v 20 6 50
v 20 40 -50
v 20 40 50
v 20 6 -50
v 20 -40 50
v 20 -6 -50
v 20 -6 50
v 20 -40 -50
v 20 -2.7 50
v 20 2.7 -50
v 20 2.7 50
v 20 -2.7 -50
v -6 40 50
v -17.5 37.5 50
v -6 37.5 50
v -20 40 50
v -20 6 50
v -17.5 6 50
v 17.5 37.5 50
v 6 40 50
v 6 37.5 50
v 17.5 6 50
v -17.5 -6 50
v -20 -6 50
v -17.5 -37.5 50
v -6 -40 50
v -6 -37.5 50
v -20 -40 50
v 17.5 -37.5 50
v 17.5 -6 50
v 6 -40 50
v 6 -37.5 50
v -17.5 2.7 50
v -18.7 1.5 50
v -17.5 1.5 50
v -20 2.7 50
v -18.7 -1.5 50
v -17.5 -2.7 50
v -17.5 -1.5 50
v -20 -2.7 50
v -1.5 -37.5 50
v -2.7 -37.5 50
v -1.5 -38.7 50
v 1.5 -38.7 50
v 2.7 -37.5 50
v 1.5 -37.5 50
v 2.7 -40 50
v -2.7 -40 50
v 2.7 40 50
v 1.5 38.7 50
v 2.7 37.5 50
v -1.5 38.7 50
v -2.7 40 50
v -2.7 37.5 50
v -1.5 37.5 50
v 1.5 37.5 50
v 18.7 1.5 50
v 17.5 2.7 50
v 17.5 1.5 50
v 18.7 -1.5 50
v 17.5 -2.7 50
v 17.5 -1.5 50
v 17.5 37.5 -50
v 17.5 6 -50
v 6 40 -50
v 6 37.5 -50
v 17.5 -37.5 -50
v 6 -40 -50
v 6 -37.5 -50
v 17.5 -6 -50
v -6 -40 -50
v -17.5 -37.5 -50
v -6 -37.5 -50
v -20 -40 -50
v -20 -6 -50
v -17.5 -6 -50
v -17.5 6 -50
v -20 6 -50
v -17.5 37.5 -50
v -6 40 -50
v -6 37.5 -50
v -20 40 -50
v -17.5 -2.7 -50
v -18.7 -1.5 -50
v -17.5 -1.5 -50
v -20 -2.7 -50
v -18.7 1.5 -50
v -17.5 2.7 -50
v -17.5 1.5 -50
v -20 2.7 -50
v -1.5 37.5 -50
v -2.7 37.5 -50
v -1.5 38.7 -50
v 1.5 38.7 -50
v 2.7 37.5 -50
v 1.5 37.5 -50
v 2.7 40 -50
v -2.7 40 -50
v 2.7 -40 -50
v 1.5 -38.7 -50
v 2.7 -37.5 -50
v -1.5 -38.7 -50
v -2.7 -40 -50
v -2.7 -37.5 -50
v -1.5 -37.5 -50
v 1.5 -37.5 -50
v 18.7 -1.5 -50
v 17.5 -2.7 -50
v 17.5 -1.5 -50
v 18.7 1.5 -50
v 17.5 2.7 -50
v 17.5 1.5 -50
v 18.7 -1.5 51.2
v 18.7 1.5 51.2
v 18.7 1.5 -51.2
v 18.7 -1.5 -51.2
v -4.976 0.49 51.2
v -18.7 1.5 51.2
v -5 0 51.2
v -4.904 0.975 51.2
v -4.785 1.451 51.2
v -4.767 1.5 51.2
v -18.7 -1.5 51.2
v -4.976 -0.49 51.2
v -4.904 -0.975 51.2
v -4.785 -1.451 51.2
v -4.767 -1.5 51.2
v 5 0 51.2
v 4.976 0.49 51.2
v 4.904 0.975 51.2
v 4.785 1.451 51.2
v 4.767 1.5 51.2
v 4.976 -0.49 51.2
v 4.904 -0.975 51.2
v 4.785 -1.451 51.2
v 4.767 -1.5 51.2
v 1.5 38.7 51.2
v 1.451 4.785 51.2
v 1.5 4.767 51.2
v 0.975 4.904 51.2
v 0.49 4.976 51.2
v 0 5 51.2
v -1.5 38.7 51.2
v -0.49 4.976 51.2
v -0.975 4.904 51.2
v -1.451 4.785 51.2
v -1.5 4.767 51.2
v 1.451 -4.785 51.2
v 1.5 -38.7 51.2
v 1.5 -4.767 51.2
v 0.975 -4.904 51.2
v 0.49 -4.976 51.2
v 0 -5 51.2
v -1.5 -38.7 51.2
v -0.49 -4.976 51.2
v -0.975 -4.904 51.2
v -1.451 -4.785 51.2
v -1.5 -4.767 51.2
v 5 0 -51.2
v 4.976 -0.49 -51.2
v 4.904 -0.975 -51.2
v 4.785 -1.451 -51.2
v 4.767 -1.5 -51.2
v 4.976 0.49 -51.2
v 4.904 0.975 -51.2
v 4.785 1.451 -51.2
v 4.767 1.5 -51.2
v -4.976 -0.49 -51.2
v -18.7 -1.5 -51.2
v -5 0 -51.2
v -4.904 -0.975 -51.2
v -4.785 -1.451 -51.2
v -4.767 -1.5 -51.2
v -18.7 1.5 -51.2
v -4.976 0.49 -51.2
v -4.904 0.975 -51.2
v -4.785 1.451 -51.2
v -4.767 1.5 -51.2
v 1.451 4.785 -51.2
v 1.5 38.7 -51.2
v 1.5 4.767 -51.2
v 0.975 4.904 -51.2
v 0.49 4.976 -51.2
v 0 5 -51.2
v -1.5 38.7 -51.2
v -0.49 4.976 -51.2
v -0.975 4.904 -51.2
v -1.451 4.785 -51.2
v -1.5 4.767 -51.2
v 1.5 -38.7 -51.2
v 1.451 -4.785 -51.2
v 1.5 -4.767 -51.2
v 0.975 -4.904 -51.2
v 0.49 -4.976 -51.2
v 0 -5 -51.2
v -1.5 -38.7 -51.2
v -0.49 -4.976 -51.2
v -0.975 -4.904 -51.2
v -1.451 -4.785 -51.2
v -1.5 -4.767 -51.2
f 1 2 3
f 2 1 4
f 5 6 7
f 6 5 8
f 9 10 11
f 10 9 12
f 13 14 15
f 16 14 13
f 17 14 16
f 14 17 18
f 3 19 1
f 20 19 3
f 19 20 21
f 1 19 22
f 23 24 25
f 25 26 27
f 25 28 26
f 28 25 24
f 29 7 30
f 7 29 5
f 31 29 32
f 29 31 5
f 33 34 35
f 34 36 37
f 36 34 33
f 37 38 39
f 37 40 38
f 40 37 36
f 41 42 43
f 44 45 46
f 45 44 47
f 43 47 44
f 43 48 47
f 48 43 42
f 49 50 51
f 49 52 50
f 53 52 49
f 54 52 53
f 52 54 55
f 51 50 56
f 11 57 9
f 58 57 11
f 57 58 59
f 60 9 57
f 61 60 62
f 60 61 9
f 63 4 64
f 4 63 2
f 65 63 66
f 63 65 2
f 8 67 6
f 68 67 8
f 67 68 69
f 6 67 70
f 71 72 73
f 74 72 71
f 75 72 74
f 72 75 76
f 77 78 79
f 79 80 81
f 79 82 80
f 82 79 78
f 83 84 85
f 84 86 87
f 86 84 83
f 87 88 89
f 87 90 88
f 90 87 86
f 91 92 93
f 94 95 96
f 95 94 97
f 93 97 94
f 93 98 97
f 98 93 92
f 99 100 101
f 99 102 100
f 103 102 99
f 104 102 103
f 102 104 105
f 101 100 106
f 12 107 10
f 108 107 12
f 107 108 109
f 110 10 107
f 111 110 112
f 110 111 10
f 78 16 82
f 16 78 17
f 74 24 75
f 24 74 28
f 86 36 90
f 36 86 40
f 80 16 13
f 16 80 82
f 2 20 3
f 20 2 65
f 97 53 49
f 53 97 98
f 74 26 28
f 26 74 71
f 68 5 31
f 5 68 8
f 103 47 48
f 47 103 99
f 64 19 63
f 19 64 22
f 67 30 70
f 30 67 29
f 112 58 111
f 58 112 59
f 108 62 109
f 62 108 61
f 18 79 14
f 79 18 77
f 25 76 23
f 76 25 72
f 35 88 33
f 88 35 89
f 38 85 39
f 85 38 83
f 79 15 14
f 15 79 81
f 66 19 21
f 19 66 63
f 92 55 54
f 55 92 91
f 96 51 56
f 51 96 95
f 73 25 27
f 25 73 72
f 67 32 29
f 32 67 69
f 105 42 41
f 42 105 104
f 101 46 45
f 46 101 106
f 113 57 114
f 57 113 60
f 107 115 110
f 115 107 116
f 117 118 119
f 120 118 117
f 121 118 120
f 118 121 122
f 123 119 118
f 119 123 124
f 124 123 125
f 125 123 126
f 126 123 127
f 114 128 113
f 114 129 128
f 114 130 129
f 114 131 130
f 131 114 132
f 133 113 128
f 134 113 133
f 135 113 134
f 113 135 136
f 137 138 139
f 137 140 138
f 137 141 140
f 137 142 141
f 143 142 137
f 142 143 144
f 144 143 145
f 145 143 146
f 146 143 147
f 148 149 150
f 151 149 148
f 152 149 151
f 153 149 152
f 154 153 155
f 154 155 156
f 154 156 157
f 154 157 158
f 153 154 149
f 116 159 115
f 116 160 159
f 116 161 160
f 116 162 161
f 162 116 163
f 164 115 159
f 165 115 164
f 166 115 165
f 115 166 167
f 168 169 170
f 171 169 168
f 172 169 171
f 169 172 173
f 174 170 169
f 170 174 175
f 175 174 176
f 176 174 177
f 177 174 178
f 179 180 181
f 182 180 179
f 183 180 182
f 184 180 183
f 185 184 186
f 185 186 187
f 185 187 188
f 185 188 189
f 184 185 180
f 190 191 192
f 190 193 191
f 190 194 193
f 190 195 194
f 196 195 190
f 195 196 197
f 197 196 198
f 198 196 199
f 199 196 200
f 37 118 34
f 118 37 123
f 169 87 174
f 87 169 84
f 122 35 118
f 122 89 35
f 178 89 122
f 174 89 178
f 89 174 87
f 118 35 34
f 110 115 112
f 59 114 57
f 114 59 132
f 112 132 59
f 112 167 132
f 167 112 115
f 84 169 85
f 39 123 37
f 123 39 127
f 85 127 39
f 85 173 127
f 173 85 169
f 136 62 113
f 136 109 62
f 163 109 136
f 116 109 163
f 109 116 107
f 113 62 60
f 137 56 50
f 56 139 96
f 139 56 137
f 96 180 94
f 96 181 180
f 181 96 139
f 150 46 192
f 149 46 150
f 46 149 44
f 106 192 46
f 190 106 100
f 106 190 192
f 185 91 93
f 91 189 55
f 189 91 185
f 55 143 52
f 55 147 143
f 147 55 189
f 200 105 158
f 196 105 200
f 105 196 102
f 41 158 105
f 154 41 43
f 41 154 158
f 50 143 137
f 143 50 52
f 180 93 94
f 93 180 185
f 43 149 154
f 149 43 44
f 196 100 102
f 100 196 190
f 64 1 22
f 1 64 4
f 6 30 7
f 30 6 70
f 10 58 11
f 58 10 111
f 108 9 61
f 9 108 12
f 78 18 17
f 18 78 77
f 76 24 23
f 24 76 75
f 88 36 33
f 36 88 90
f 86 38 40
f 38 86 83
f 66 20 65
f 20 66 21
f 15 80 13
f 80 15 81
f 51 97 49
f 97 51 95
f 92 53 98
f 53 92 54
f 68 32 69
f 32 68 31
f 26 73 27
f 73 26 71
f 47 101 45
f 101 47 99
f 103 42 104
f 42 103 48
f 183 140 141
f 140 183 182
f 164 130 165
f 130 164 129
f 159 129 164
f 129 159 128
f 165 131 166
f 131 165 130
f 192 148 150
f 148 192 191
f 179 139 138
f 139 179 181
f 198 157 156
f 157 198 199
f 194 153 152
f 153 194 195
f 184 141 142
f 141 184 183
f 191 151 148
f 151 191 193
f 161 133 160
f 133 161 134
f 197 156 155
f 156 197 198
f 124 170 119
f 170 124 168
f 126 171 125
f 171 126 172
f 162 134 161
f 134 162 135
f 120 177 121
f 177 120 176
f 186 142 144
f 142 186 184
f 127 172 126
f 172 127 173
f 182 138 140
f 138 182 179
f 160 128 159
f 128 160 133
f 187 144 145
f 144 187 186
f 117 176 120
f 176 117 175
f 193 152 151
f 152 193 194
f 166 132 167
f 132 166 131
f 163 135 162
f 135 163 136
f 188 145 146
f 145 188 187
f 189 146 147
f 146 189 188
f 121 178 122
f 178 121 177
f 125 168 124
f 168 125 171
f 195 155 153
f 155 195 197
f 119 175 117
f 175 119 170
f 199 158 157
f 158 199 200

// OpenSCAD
// 40x80 aluminium extrusion profile (connected solid), 100mm long
// Fixes: ensure outer body is NOT split by slot cuts; ensure internal webs connect to outer walls;
// add slight overlaps (1-2mm) for robust connectivity.

cross_section_width_mm  = 40;   // X
cross_section_height_mm = 80;   // Y
length_mm               = 100;  // Z

wall_thickness_mm       = 2.5;

slot_opening_mm         = 6;
slot_depth_mm           = 8;
slot_cavity_width_mm    = 12;

web_thickness_mm        = 3;

center_bore_diameter_mm = 10;

cornerHole                      = 1;
corner_hole_diameter_mm         = 6;
corner_hole_offset_from_edges_mm= 10;

// Use 1-2mm overlap to guarantee attachment/union robustness
overlap_mm = 1.2;
$fn = 64;

// --- Helpers: T-slot cutters with a "bridge keepout" so the outer body never gets split ---
module tslot_cut_x(side=1) { // side: +1 right, -1 left
    x_face        = side * cross_section_width_mm/2;
    x_open_center = x_face - side * (slot_depth_mm/2);
    x_cav_center  = x_face - side * (slot_depth_mm*0.65);

    // Keep a thin bridge of material at the centerline (y=0) so left/right halves remain connected.
    // This does NOT change the overall look much, but prevents a full-depth cut that splits the body.
    bridge_keep_y = web_thickness_mm + 2*overlap_mm;

    difference() {
        union() {
            translate([x_open_center, 0, 0])
                cube([slot_depth_mm + 2*overlap_mm, slot_opening_mm, length_mm + 2*overlap_mm], center=true);

            translate([x_cav_center, 0, 0])
                cube([slot_depth_mm + 2*overlap_mm, slot_cavity_width_mm, length_mm + 2*overlap_mm], center=true);
        }

        // Remove the cutter volume around y=0 so a small connecting rib remains in the final part
        translate([x_face - side*(slot_depth_mm/2), 0, 0])
            cube([slot_depth_mm + 6*overlap_mm, bridge_keep_y, length_mm + 6*overlap_mm], center=true);
    }
}

module tslot_cut_y(side=1) { // side: +1 top, -1 bottom
    y_face        = side * cross_section_height_mm/2;
    y_open_center = y_face - side * (slot_depth_mm/2);
    y_cav_center  = y_face - side * (slot_depth_mm*0.65);

    // Keep a thin bridge of material at the centerline (x=0) so top/bottom halves remain connected.
    bridge_keep_x = web_thickness_mm + 2*overlap_mm;

    difference() {
        union() {
            translate([0, y_open_center, 0])
                cube([slot_opening_mm, slot_depth_mm + 2*overlap_mm, length_mm + 2*overlap_mm], center=true);

            translate([0, y_cav_center, 0])
                cube([slot_cavity_width_mm, slot_depth_mm + 2*overlap_mm, length_mm + 2*overlap_mm], center=true);
        }

        // Remove the cutter volume around x=0 so a small connecting rib remains in the final part
        translate([0, y_face - side*(slot_depth_mm/2), 0])
            cube([bridge_keep_x, slot_depth_mm + 6*overlap_mm, length_mm + 6*overlap_mm], center=true);
    }
}

// --- Main profile (single connected solid) ---
module extrusion_4080_connected() {

    // Dimensions for inner void
    inner_w = cross_section_width_mm  - 2*wall_thickness_mm;
    inner_h = cross_section_height_mm - 2*wall_thickness_mm;

    // Webs must physically touch the outer walls; make them slightly longer than the inner void
    // so they overlap into the wall thickness by ~overlap_mm on each side.
    web_x_len = inner_w + 2*overlap_mm; // horizontal web spans X
    web_y_len = inner_h + 2*overlap_mm; // vertical web spans Y

    // Build as: (outer shell with internal webs) - (slots + holes)
    difference() {
        union() {
            // Outer shell (outer minus inner)
            difference() {
                cube([cross_section_width_mm, cross_section_height_mm, length_mm], center=true);

                // Inner void (slightly longer in Z to avoid coplanar faces)
                cube([inner_w, inner_h, length_mm + 2*overlap_mm], center=true);
            }

            // Internal webs (explicit solids) to ensure they are attached to the outer shell
            // Horizontal web
            cube([web_x_len, web_thickness_mm, length_mm + 2*overlap_mm], center=true);

            // Vertical web
            cube([web_thickness_mm, web_y_len, length_mm + 2*overlap_mm], center=true);
        }

        // T-slots on all four faces (with centerline bridge keepouts to prevent splitting)
        tslot_cut_x(+1);
        tslot_cut_x(-1);
        tslot_cut_y(+1);
        tslot_cut_y(-1);

        // Center bore
        cylinder(r=center_bore_diameter_mm/2, h=length_mm + 4*overlap_mm, center=true);

        // Corner holes (optional)
        if (cornerHole) {
            for (sx = [-1, 1], sy = [-1, 1]) {
                translate([
                    sx * (cross_section_width_mm/2  - corner_hole_offset_from_edges_mm),
                    sy * (cross_section_height_mm/2 - corner_hole_offset_from_edges_mm),
                    0
                ])
                    cylinder(r=corner_hole_diameter_mm/2, h=length_mm + 4*overlap_mm, center=true);
            }
        }
    }
}

color("Silver") extrusion_4080_connected();
